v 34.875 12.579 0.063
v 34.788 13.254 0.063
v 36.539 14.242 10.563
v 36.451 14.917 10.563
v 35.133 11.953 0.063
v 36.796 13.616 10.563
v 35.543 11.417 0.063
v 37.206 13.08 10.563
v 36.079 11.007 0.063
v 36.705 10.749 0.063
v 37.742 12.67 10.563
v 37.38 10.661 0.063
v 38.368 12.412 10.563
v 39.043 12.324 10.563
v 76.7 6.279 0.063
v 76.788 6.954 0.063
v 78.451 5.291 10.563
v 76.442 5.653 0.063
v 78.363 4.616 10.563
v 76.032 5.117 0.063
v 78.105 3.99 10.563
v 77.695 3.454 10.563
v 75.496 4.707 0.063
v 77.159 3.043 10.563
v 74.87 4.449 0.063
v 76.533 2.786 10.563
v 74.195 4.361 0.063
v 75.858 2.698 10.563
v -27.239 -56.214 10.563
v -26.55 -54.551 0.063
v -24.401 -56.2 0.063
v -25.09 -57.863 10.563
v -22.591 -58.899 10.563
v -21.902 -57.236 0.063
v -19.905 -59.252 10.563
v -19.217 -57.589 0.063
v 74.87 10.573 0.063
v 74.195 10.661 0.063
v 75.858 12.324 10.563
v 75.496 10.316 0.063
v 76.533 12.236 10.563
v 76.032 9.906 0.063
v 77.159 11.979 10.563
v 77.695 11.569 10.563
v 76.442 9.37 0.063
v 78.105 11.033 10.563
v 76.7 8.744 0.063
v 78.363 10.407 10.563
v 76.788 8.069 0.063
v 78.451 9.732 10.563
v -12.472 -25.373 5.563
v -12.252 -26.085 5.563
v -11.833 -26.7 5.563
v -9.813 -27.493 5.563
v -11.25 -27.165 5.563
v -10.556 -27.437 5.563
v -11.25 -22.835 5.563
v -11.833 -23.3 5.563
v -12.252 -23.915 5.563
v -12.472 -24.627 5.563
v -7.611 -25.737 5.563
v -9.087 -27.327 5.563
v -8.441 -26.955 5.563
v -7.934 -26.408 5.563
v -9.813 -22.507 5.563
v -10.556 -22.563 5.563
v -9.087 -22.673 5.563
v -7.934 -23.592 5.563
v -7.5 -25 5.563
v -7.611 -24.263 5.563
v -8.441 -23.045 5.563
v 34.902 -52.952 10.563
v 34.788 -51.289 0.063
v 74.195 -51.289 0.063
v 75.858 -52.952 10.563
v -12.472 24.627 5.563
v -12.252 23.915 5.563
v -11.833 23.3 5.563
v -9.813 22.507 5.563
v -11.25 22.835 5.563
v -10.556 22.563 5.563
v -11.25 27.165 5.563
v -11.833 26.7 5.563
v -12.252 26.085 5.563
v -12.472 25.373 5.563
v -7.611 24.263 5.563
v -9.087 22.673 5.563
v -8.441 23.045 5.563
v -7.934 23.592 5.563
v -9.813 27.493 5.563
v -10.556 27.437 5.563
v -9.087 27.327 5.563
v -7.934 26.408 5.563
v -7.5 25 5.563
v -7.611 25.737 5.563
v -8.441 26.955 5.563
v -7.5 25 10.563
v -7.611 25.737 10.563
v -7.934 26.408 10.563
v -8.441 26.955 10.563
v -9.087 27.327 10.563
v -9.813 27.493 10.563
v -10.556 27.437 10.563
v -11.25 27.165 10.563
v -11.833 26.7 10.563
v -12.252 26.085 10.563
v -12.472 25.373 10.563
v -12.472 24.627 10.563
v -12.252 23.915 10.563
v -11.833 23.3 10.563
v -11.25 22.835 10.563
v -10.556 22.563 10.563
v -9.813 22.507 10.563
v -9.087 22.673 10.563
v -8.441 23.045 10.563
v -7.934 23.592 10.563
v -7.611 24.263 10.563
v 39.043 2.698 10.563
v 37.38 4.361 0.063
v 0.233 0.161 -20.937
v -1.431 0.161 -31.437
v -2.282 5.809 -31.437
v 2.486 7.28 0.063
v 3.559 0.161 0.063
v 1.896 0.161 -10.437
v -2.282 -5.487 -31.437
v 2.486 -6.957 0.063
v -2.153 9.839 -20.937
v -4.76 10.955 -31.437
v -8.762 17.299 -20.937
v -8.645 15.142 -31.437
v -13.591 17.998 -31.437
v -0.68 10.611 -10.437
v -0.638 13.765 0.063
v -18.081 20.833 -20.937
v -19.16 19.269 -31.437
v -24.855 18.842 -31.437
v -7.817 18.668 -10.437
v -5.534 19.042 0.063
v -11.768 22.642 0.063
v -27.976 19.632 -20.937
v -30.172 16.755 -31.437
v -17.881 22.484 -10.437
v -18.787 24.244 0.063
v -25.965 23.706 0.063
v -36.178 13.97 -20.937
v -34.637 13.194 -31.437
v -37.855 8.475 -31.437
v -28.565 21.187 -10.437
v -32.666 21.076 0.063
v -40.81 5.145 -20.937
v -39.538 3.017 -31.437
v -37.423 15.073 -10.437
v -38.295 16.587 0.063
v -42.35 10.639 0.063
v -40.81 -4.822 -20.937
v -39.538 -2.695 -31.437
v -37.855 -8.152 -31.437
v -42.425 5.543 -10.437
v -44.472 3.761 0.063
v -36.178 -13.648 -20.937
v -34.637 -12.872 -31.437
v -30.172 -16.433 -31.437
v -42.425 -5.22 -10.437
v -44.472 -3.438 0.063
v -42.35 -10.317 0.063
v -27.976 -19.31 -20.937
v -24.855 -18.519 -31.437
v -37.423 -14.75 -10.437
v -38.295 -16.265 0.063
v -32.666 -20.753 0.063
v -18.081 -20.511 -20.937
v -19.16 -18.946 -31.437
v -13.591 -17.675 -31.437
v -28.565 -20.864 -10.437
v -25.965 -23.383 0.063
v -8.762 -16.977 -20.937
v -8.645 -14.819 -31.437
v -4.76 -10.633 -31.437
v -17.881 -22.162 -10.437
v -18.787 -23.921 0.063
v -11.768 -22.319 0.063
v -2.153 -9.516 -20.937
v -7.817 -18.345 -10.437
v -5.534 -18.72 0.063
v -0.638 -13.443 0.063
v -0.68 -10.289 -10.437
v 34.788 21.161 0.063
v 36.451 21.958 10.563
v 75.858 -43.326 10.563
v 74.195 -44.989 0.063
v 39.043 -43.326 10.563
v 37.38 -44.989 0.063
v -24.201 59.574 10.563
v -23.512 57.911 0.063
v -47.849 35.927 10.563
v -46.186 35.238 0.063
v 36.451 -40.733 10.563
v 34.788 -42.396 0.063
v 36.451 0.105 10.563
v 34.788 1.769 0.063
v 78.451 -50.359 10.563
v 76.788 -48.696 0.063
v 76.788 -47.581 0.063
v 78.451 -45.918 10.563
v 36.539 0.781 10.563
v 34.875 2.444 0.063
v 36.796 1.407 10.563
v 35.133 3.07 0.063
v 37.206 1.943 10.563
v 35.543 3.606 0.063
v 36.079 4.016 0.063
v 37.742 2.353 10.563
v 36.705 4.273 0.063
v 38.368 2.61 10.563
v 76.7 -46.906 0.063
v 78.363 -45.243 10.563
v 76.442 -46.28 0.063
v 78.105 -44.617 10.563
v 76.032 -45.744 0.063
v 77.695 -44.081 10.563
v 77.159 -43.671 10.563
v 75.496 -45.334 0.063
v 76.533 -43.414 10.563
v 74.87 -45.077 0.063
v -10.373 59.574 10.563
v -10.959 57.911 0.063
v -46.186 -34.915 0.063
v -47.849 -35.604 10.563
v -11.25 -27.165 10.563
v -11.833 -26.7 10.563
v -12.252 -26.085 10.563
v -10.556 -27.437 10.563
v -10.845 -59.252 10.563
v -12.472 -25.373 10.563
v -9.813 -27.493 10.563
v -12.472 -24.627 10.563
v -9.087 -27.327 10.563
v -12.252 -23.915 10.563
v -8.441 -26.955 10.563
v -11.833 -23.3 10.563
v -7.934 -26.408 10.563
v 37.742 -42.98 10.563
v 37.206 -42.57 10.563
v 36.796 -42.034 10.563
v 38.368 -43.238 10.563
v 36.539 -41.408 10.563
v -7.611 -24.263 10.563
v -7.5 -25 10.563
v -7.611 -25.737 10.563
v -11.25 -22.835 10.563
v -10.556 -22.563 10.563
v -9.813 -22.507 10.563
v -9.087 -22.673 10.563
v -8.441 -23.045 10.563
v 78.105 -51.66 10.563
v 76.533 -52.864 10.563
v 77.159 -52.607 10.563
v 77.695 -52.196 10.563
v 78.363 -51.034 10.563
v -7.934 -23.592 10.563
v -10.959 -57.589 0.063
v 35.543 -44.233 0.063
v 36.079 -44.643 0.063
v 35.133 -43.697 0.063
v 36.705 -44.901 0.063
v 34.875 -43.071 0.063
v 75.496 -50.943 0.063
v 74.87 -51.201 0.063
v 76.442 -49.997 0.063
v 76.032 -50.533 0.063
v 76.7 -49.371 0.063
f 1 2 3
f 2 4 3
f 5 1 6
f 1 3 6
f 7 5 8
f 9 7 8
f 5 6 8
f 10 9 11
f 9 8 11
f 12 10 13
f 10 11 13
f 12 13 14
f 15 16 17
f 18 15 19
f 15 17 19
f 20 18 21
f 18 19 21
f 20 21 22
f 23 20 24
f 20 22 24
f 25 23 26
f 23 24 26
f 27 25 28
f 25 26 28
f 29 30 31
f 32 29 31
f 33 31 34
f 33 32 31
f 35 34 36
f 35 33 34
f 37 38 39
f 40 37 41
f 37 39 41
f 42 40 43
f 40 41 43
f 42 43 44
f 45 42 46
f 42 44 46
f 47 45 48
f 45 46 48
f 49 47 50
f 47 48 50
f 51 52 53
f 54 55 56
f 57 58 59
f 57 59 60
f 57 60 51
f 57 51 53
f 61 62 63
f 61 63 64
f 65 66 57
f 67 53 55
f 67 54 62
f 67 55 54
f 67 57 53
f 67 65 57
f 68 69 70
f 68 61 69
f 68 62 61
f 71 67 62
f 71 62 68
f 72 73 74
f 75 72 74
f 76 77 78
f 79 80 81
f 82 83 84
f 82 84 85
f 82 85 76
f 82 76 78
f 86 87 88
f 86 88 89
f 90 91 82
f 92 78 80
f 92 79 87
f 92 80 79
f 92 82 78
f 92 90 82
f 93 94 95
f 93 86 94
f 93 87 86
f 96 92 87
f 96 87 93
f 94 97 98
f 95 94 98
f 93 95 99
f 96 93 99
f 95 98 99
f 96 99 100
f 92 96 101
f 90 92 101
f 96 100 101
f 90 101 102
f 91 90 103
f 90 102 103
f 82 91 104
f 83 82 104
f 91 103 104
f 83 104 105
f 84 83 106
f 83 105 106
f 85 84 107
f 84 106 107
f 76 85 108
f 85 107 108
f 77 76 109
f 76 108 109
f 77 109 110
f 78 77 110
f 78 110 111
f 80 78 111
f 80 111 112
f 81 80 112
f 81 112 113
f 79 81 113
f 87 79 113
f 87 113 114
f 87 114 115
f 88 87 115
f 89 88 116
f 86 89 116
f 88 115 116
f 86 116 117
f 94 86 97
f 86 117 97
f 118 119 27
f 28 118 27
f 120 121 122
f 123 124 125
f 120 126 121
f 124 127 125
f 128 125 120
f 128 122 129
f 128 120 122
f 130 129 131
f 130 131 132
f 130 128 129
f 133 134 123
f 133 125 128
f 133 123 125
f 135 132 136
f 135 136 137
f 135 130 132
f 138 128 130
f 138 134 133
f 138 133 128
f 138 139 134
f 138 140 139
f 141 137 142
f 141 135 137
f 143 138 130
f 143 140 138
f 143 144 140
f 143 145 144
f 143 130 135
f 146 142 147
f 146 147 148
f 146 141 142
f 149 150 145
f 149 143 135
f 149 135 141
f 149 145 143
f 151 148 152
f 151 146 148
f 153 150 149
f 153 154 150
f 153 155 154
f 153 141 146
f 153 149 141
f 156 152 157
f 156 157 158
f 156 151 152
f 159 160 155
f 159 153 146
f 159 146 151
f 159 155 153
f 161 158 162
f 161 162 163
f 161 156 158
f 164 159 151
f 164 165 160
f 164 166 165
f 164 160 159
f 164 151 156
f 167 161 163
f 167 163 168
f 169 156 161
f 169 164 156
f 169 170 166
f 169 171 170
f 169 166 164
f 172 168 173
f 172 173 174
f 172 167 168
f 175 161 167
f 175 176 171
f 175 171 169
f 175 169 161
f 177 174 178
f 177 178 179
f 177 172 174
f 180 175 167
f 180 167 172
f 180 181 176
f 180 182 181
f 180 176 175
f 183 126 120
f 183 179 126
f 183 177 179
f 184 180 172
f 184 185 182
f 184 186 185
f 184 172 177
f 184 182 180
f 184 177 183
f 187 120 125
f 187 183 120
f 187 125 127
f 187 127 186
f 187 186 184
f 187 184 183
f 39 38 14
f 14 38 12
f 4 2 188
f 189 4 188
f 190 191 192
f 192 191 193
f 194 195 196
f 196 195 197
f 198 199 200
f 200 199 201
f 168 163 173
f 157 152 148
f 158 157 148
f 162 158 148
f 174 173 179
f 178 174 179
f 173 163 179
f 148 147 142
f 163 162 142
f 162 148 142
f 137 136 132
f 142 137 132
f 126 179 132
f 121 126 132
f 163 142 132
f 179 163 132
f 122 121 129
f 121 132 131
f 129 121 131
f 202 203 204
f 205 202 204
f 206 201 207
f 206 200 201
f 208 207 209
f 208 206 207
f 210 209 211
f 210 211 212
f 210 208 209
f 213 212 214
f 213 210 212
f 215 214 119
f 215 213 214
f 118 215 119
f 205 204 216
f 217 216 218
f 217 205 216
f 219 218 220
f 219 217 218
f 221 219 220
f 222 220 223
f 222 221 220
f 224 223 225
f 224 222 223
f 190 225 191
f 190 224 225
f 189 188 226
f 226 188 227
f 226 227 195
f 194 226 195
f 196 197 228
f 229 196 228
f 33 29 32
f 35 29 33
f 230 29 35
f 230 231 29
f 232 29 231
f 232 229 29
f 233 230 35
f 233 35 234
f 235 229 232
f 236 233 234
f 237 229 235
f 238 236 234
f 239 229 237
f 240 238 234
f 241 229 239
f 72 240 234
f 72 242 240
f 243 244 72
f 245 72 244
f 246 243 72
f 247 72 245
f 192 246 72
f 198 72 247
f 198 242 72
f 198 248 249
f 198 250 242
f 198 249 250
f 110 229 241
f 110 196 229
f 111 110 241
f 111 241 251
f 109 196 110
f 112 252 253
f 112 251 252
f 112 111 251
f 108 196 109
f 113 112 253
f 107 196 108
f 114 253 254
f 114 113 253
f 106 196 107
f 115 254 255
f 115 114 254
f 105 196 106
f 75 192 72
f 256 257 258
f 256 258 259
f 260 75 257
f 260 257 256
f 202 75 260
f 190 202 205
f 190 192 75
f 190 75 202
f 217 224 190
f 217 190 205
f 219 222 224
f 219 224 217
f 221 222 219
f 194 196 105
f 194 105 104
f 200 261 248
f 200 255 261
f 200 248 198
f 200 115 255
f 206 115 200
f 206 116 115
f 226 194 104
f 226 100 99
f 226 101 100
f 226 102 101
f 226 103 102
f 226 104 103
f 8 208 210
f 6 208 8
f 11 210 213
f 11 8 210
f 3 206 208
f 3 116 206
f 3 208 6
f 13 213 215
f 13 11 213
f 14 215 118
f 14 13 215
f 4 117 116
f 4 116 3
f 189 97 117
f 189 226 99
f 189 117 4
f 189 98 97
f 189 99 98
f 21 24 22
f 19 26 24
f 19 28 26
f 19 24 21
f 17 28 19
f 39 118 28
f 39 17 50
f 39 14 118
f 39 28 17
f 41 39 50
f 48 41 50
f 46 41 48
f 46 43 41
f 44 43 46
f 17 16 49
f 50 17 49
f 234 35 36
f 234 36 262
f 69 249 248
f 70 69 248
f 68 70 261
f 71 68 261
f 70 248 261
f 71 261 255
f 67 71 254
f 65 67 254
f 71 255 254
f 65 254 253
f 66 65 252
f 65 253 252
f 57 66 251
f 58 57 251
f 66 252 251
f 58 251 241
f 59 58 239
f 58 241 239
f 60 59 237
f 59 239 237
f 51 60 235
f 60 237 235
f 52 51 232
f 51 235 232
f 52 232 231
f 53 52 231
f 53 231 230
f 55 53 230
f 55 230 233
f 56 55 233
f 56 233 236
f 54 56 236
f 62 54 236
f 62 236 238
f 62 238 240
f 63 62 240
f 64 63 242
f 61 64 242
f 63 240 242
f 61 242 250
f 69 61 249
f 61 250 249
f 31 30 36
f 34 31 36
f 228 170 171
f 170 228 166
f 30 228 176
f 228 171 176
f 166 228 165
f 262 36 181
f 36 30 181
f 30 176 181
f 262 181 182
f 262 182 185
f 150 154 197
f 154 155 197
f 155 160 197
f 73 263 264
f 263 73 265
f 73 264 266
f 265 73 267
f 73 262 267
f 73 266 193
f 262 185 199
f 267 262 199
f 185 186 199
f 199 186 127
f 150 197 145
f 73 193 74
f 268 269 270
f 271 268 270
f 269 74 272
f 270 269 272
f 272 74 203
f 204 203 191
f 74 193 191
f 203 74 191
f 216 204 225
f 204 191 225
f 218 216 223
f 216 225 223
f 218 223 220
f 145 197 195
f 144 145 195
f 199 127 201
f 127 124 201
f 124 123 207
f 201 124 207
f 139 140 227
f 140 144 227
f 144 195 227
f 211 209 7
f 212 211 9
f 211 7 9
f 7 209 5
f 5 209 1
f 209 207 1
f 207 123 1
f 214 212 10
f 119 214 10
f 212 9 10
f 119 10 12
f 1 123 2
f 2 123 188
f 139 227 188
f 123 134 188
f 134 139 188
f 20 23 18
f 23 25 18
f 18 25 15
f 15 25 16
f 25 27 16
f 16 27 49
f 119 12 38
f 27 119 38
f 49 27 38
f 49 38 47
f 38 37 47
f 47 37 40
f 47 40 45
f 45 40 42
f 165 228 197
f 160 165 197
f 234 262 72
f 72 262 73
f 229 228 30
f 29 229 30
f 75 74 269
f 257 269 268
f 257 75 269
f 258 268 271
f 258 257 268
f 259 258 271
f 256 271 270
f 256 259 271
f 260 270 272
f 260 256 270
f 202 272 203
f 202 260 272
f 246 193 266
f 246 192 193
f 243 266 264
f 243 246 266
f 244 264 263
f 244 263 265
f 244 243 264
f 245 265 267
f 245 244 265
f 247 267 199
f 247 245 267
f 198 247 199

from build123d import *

# Parameters (mm, degrees)
RESSALTO_EXTRUS_O1_DEPTH = 10
RESSALTO_EXTRUS_O1_DRAFT = -9
ESBO_O2_R                = 23
RESSALTO_EXTRUS_O2_DEPTH = 30
RESSALTO_EXTRUS_O2_DRAFT = -9
FILETE1_R                = 10
FILETE2_R                = 2.5
ESCALA1_SCALE            = 1.05
ESBO_O3_R                = 2.5
CORTE_EXTRUS_O1_DEPTH    = 5


with BuildPart() as part:
    # Esboço1 → Ressalto-extrusão1 (with draft: the straight prism first)
    with BuildSketch(Plane.XY):
        Polygon((-22.781745931, 55), (-44.375431078, 33.406314852), (-44.375431078, -33.406314852), (-22.781745931, -55), (-10.825814677, -55), (32.742040246, -49), (72.742040246, -49), (72.742040246, -43), (32.742040246, -43), (32.742040246, 4), (72.742040246, 4), (72.742040246, 10), (32.742040246, 10), (32.742040246, 20), (-10.825814677, 55), align=None)
    extrude(amount=RESSALTO_EXTRUS_O1_DEPTH)
    # Ressalto-extrusão1: the draft: its side faces are tilted about the plane it starts from
    ressalto_extrus_o1_sides = [part.faces().sort_by_distance(p)[0] for p in [
        (-33.578588504, 44.203157426, 5),
        (-44.375431078, 0, 5),
        (-33.578588504, -44.203157426, 5),
        (-16.803780304, -55, 5),
        (10.958112785, -52, 5),
        (52.742040246, -49, 5),
        (72.742040246, -46, 5),
        (52.742040246, -43, 5),
        (32.742040246, -19.5, 5),
        (52.742040246, 4, 5),
        (72.742040246, 7, 5),
        (52.742040246, 10, 5),
        (32.742040246, 15, 5),
        (10.958112785, 37.5, 5),
        (-16.803780304, 55, 5),
    ]]
    draft(ressalto_extrus_o1_sides, Plane.XY, RESSALTO_EXTRUS_O1_DRAFT)


with BuildPart() as ressalto_extrus_o2_tool:
    # Esboço2 → Ressalto-extrusão2 (with draft: the straight prism first)
    with BuildSketch(Plane.XY):
        with Locations((-20, 0)):
            Circle(ESBO_O2_R)
    extrude(amount=-RESSALTO_EXTRUS_O2_DEPTH)
    # Ressalto-extrusão2: the draft: its side faces are tilted about the plane it starts from
    ressalto_extrus_o2_sides = [ressalto_extrus_o2_tool.faces().sort_by_distance(p)[0] for p in [
        (-43, 0, -15),
    ]]
    draft(ressalto_extrus_o2_sides, Plane.XY, RESSALTO_EXTRUS_O2_DRAFT)


with BuildPart() as part_1:
    add(part.part)

    # Ressalto-extrusão2: add ressalto_extrus_o2_tool
    add(ressalto_extrus_o2_tool.part)

    # Filete1
    filete1_edges = [part_1.edges().sort_by_distance(p)[0] for p in [
        (-23.109770847, -55.791922202, 5),
    ]]
    fillet(filete1_edges, radius=FILETE1_R)

    # Filete2
    filete2_edges = [part_1.edges().sort_by_distance(p)[0] for p in [
        (33.533962448, 10.791922202, 5),
        (73.533962448, 10.791922202, 5),
        (73.533962448, 3.208077798, 5),
        (33.533962448, 3.208077798, 5),
        (33.533962448, -42.208077798, 5),
        (73.533962448, -42.208077798, 5),
        (73.533962448, -49.791922202, 5),
    ]]
    fillet(filete2_edges, radius=FILETE2_R)


with BuildPart() as part_2:
    # Escala1: scaled about (-8.171649515, -3.224100795, -1.267383115)
    add(part_1.part.scale(ESCALA1_SCALE).moved(Location((0.408582476, 0.16120504, 0.063369156))))

    # Esboço3 → Corte-extrusão1 (cut)
    with BuildSketch(Plane.XY.offset(10.563369297)):
        with Locations((-10, 25)):
            Circle(ESBO_O3_R)
        with Locations((-10, -25)):
            Circle(ESBO_O3_R)
    extrude(amount=-CORTE_EXTRUS_O1_DEPTH, mode=Mode.SUBTRACT)


solid = part_2.part
